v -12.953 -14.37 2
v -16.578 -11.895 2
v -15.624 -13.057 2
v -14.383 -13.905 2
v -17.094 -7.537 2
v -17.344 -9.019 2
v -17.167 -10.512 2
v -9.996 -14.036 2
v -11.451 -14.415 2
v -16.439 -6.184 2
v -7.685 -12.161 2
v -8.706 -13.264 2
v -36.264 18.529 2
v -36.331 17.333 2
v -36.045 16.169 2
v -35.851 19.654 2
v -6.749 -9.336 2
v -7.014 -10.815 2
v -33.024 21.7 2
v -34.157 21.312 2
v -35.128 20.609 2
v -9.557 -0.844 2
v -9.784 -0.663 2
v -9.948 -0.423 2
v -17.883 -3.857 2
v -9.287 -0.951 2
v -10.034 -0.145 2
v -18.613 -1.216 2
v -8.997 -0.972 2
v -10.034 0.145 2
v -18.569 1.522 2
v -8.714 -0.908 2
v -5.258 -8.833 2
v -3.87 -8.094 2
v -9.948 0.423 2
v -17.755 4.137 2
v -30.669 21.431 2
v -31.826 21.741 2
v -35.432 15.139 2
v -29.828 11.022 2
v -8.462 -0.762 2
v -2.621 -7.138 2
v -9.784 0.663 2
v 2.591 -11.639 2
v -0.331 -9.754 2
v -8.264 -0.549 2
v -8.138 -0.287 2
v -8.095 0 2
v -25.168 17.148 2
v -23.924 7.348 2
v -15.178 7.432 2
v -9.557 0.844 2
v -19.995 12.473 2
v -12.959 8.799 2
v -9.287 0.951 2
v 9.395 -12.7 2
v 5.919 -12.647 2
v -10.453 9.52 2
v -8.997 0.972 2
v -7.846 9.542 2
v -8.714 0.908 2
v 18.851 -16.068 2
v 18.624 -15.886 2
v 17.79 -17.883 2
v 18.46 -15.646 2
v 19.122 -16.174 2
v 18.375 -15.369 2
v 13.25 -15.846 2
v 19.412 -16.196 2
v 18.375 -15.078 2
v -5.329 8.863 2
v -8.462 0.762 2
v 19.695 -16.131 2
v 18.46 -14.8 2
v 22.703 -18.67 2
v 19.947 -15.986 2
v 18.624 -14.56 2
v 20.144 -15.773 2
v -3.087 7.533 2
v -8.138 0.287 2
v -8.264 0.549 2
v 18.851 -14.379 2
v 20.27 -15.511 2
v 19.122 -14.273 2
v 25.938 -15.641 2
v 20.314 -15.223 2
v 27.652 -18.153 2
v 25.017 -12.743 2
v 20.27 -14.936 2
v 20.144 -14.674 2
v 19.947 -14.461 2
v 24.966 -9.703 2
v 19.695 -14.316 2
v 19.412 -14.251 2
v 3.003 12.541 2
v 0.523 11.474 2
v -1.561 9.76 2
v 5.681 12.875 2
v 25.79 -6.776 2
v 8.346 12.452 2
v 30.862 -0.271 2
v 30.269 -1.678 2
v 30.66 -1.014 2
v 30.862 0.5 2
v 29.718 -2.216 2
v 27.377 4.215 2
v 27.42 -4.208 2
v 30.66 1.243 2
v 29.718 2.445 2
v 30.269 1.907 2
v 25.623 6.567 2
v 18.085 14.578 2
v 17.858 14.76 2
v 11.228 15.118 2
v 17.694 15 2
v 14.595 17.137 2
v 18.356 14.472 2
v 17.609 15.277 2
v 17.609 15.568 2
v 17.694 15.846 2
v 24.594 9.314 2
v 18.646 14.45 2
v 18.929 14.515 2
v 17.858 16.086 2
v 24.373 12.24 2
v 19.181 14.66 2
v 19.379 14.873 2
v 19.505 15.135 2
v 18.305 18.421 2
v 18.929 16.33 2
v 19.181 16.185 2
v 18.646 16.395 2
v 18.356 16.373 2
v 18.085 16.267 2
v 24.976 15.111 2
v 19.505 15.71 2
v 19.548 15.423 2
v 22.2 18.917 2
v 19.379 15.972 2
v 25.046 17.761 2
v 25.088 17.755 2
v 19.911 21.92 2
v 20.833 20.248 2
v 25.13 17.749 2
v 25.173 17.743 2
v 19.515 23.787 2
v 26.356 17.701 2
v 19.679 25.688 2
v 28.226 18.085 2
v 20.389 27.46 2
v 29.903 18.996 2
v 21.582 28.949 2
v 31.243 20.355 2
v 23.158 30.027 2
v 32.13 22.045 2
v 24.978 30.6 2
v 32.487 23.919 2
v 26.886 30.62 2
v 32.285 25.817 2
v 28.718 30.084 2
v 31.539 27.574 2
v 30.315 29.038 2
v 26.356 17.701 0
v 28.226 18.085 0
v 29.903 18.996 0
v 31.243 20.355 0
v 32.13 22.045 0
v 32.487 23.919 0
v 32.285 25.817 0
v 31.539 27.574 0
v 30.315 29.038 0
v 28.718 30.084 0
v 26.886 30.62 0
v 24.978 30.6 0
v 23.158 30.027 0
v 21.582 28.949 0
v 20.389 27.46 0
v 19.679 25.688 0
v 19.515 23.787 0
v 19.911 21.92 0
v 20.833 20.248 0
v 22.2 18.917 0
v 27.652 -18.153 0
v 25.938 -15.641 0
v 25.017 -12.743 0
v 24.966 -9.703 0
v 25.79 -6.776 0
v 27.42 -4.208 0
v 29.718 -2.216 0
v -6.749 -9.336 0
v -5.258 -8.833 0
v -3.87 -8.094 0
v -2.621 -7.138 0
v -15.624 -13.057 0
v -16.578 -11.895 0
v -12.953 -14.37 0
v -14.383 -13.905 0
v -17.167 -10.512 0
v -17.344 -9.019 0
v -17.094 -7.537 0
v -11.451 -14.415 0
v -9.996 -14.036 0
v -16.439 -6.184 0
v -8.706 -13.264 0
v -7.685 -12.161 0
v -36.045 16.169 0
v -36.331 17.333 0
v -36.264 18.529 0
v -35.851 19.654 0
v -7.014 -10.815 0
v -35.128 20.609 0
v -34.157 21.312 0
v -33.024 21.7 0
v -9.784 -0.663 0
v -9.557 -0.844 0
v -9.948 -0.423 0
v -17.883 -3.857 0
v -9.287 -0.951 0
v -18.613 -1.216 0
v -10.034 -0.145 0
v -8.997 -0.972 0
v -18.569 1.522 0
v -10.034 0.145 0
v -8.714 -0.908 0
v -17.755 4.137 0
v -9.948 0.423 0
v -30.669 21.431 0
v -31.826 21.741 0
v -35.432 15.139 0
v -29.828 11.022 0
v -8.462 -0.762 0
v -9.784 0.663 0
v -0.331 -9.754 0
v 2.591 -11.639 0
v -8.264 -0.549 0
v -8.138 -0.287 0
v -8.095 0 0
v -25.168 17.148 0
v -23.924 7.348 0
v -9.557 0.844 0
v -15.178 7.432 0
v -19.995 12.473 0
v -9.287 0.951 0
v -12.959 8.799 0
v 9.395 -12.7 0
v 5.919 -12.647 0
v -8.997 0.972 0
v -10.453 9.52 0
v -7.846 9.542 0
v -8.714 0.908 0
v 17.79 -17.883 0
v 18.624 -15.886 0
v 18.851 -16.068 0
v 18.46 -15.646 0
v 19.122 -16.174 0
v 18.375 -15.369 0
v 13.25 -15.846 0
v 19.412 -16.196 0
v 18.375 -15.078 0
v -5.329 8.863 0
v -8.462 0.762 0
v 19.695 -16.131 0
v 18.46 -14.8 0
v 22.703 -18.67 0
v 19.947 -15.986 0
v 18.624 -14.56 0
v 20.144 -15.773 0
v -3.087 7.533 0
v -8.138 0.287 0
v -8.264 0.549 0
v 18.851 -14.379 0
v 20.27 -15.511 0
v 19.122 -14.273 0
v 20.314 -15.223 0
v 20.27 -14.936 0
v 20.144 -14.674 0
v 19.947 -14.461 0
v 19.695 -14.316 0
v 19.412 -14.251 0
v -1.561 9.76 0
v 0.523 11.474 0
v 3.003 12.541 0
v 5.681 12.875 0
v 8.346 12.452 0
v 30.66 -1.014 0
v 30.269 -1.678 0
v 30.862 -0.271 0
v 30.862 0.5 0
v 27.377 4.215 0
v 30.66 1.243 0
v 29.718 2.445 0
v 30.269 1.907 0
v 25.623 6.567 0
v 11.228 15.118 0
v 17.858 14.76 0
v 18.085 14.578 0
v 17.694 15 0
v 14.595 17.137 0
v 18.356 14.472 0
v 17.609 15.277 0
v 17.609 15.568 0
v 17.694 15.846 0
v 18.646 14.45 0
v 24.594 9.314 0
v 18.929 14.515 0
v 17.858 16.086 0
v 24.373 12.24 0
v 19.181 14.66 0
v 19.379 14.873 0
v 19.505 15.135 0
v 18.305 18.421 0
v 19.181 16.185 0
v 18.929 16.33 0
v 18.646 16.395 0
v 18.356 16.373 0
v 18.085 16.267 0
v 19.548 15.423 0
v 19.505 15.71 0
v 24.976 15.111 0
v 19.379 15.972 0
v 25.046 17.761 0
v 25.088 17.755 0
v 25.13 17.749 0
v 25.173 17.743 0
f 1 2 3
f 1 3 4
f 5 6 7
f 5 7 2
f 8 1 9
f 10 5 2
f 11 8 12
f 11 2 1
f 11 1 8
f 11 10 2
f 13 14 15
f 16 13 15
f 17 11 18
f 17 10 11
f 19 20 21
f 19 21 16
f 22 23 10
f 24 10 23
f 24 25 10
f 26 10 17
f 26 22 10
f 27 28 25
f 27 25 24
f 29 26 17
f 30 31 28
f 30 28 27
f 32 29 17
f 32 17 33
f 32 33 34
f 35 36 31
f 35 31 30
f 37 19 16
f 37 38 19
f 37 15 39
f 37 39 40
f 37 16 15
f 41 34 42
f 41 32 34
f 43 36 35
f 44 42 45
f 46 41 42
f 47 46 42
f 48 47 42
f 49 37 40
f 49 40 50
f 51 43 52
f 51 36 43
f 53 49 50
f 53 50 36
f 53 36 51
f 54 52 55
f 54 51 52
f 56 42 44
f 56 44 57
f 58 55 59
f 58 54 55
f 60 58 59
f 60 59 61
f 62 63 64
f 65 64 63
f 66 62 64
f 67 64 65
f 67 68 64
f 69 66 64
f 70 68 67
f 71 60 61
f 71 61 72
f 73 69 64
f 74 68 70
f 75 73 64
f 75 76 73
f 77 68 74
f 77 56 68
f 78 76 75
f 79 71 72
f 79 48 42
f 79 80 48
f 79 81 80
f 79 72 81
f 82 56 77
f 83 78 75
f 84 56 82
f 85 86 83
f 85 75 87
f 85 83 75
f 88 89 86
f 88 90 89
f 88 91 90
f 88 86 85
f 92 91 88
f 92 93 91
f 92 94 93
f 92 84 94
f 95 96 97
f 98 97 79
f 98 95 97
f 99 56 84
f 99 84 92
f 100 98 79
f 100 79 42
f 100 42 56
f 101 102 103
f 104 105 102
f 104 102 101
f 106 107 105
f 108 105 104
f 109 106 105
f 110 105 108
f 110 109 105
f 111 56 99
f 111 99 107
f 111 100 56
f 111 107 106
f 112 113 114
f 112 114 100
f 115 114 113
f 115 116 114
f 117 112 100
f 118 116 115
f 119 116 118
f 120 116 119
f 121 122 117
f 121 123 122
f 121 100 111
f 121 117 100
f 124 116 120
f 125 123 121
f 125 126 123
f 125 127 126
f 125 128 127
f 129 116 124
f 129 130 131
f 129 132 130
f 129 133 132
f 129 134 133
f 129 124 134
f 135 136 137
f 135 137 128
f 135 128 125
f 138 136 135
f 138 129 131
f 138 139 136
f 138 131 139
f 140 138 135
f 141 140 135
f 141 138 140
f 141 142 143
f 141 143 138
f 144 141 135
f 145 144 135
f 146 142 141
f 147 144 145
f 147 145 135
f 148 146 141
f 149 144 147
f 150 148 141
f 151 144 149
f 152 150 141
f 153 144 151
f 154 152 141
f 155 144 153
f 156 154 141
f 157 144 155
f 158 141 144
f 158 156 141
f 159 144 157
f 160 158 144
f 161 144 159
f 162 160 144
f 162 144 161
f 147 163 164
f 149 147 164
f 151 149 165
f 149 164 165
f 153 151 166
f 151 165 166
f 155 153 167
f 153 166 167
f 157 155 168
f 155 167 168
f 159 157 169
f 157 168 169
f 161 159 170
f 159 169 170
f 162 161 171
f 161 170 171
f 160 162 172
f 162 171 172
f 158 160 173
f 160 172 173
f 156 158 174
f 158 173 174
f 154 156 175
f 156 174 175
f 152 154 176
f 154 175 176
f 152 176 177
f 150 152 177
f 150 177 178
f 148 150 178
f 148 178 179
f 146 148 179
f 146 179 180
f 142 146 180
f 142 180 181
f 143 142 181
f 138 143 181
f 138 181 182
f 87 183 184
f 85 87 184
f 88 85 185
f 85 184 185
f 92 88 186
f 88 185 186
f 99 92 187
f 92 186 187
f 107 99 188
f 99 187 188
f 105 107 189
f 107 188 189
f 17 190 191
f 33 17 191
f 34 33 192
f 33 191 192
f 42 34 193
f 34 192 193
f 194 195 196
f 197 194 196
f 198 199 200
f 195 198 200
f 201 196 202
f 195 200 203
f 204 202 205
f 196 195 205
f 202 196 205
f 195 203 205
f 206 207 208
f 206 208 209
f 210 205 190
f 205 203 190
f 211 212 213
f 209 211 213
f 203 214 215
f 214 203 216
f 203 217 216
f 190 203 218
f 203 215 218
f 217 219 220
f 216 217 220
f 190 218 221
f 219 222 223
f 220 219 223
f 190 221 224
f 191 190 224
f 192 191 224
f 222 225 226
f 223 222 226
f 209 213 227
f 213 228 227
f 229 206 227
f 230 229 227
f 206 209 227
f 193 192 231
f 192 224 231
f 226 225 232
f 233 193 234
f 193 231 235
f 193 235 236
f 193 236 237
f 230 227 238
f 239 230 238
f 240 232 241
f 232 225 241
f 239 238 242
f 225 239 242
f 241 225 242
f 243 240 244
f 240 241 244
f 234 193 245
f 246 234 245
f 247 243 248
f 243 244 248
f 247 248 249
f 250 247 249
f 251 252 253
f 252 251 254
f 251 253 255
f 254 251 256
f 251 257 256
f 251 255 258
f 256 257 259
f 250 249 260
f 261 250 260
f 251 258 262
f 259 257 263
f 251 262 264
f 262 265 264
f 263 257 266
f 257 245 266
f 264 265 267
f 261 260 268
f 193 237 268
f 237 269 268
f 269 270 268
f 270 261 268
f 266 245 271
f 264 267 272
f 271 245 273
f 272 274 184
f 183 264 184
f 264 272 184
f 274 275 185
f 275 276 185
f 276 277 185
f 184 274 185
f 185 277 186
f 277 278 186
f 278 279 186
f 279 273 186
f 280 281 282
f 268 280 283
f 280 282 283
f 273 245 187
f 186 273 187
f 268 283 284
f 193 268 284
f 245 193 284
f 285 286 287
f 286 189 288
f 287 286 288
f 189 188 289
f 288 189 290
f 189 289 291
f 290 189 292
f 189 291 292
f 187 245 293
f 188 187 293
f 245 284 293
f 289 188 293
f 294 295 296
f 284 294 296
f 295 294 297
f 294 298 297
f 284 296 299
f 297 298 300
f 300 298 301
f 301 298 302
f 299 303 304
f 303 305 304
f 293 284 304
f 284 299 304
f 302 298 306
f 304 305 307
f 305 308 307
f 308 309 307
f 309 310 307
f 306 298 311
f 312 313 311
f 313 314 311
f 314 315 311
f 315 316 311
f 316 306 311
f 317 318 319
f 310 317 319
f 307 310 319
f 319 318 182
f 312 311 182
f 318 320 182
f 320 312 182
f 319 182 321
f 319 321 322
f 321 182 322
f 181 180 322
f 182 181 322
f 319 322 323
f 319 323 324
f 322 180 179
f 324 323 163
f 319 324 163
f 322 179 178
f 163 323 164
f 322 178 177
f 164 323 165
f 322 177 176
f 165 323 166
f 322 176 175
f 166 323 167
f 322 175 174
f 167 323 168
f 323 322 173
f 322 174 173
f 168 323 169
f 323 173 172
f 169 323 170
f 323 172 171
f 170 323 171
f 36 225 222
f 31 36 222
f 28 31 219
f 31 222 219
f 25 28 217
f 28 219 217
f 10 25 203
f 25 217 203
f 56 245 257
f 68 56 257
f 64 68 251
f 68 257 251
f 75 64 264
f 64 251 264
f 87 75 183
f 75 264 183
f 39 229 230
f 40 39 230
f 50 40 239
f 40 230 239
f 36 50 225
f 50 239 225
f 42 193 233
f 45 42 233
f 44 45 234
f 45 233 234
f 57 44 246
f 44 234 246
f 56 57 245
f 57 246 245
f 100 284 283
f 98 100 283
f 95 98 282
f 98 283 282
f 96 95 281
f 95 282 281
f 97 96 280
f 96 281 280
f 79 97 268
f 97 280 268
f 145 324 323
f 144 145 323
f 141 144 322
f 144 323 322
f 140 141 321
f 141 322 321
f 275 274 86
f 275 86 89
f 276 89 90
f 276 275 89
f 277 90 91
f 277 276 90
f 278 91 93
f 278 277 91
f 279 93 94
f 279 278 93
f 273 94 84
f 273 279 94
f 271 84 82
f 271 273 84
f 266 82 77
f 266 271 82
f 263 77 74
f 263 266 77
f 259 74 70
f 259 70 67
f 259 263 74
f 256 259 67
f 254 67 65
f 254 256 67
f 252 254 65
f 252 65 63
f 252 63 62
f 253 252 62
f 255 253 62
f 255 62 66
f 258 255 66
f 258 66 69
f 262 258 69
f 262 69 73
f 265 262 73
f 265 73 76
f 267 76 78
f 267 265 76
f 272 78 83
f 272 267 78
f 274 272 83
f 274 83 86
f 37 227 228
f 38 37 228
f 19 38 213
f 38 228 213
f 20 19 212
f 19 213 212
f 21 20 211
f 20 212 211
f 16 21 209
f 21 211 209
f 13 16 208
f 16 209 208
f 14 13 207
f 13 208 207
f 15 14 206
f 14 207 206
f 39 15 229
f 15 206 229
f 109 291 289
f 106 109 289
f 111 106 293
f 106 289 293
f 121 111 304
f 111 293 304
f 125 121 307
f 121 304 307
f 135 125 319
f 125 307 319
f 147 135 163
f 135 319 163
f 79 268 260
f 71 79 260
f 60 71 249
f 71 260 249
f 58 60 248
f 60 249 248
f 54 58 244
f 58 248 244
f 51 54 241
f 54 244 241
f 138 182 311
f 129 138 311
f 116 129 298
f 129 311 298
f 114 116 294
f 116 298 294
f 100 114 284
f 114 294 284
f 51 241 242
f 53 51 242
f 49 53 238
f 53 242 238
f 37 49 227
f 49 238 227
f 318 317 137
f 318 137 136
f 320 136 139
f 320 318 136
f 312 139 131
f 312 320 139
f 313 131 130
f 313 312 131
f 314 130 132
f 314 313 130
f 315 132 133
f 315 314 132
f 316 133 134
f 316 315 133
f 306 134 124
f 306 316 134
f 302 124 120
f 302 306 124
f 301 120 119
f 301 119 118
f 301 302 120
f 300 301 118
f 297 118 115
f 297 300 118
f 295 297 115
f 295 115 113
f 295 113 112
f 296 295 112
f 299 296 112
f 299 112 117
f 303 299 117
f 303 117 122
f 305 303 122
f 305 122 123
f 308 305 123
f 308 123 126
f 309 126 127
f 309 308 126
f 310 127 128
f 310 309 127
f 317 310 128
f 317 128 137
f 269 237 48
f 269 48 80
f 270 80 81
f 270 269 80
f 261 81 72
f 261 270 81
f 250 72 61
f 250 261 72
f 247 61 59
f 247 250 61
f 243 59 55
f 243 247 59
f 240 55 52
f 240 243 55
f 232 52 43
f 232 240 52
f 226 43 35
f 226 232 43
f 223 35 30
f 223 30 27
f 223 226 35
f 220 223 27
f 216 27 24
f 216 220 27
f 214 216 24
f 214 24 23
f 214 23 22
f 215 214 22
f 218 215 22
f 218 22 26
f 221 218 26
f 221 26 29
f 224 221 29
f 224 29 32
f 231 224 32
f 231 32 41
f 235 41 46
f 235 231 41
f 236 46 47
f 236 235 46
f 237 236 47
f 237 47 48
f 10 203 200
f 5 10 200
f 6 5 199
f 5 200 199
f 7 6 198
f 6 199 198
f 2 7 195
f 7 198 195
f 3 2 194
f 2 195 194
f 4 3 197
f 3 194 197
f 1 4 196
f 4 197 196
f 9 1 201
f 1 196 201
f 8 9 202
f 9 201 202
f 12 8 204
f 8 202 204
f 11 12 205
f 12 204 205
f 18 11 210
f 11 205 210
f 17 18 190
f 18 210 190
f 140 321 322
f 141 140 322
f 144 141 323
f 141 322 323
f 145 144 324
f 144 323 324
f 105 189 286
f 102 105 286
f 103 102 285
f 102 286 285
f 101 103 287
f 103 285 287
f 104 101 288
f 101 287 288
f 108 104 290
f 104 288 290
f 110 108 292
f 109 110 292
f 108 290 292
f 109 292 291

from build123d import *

# Parameters (mm, degrees)
F1_R     = 0.975
F1_R_2   = 5.495
F2_DEPTH = 2


# Not quite as in the source:
# - the program builds the solid bodies; features that only make, move or delete a surface that nothing else refers to are left out


with BuildPart() as f2:
    # F1 (on Top) → F2 (new body)
    with BuildSketch(Plane.XY):
        with BuildLine():
            ThreePointArc((8.3461548541, 12.451567302), (1.7252198574, 12.0948349613), (-3.0867358283, 7.5331334509))
            ThreePointArc((-3.0867358283, 7.5331334509), (-9.1504459177, 9.6196614304), (-15.1782928372, 7.431685066))
            ThreePointArc((-15.1782928372, 7.431685066), (-22.5381757879, 14.8578874844), (-30.6692253798, 21.4307401329))
            ThreePointArc((-30.6692253798, 21.4307401329), (-35.5250947404, 20.1584087851), (-35.4319922626, 15.1394819841))
            ThreePointArc((-35.4319922626, 15.1394819841), (-26.9109452732, 9.1280444677), (-17.7545223506, 4.1374991998))
            ThreePointArc((-17.7545223506, 4.1374991998), (-18.6125164693, -1.2164521529), (-16.4388114376, -6.1839420049))
            ThreePointArc((-16.4388114376, -6.1839420049), (-13.6846503599, -14.1883393203), (-6.7486233515, -9.3357823691))
            ThreePointArc((-6.7486233515, -9.3357823691), (-4.5490625181, -8.4916373097), (-2.6206436977, -7.1381789267))
            ThreePointArc((-2.6206436977, -7.1381789267), (2.5909813664, -11.6392406956), (9.3949967995, -12.7003565431))
            ThreePointArc((9.3949967995, -12.7003565431), (17.7901975829, -17.882711986), (27.6524089277, -18.1528814137))
            ThreePointArc((27.6524089277, -18.1528814137), (24.9662444476, -9.7026669711), (29.7177772104, -2.2163768254))
            ThreePointArc((29.7177772104, -2.2163768254), (30.8881367766, 0.1144698658), (29.7177772104, 2.4453165571))
            ThreePointArc((29.7177772104, 2.4453165571), (24.594325339, 9.3144076758), (26.3560396261, 17.700737901))
            ThreePointArc((26.3560396261, 17.700737901), (27.8220537541, 30.4194435664), (22.2002219007, 18.9168491704))
            ThreePointArc((22.2002219007, 18.9168491704), (14.5953140013, 17.1367848208), (8.3461548541, 12.451567302))
        make_face()
        with BuildLine():
            Line((-17.6755707347, -0.4939858073), (-12.0034380316, -0.4939858073))
            ThreePointArc((-12.0034380316, -0.4939858073), (-10.5336675739, -2.589890275), (-7.9799964747, -2.7682288675))
            Line((-7.9799964747, -2.7682288675), (-5.2005199999, -7.702828149))
            ThreePointArc((-5.2005199999, -7.702828149), (-5.9901385216, -8.0511163546), (-6.810625891, -8.3187029026))
            ThreePointArc((-6.810625891, -8.3187029026), (-7.2968984625, -8.4404428952), (-7.7895048721, -8.5332898913))
            ThreePointArc((-7.7895048721, -8.5332898913), (-13.3753397984, -13.2373782399), (-15.1250045058, -6.1473378715))
            ThreePointArc((-15.1250045058, -6.1473378715), (-15.4687321672, -5.7824640106), (-15.7903406401, -5.3979518136))
            ThreePointArc((-15.7903406401, -5.3979518136), (-17.1156764189, -3.0930980197), (-17.6755707347, -0.4939858073))
        make_face(mode=Mode.SUBTRACT)
        with Locations((-9.069736782, 0)):
            Circle(F1_R, mode=Mode.SUBTRACT)
        with Locations((19.3387361329, -15.2233078331)):
            Circle(F1_R, mode=Mode.SUBTRACT)
        with BuildLine():
            ThreePointArc((20.3872606575, 17.7804109262), (22.7170872685, 17.9218257414), (25.0456576674, 17.7610461256))
            ThreePointArc((25.0456576674, 17.7610461256), (25.1091906486, 17.7523846185), (25.172692422, 17.7434972003))
            ThreePointArc((25.172692422, 17.7434972003), (23.684740061, 8.8128379715), (29.166954709, 1.6075621931))
            ThreePointArc((29.166954709, 1.6075621931), (29.8880875558, 0.1007714549), (29.1453733807, -1.3954994316))
            ThreePointArc((29.1453733807, -1.3954994316), (24.1127403048, -8.7463736841), (25.8509191741, -17.4837349662))
            ThreePointArc((25.8509191741, -17.4837349662), (23.5178476173, -17.6742786032), (21.1797885868, -17.5602183711))
            ThreePointArc((21.1797885868, -17.5602183711), (20.0605128424, -12.3371922115), (16.6143622853, -16.4184698048))
            ThreePointArc((16.6143622853, -16.4184698048), (12.9131993659, -14.4284100321), (9.7748074556, -11.6338723113))
            ThreePointArc((9.7748074556, -11.6338723113), (2.6662624957, -10.5651214915), (-2.4218244994, -5.4872271944))
            ThreePointArc((-2.4218244994, -5.4872271944), (-3.341520275, -6.4414234179), (-4.3966137229, -7.2433639198))
            Line((-4.3966137229, -7.2433639198), (-7.1815796443, -2.2990188393))
            ThreePointArc((-7.1815796443, -2.2990188393), (-6.094920293, 0.0330432552), (-7.2331126554, 2.3403924495))
            Line((-7.2331126554, 2.3403924495), (-4.4863168152, 7.3004562466))
            ThreePointArc((-4.4863168152, 7.3004562466), (-3.5431905745, 6.6152616741), (-2.7011412367, 5.8090783073))
            ThreePointArc((-2.7011412367, 5.8090783073), (1.7884096787, 11.0249893996), (8.6656284498, 11.2812274136))
            ThreePointArc((8.6656284498, 11.2812274136), (11.9172089396, 14.3848906615), (15.8355289242, 16.5876774731))
            ThreePointArc((15.8355289242, 16.5876774731), (19.3270471679, 12.5448488398), (20.3872606575, 17.7804109262))
        make_face(mode=Mode.SUBTRACT)
        with BuildLine():
            ThreePointArc((-16.3638620166, 4.5934885503), (-26.0025688441, 9.741867589), (-34.9414590553, 16.0273045526))
            ThreePointArc((-34.9414590553, 16.0273045526), (-34.7398034138, 19.6908643856), (-31.1758954498, 20.5631577259))
            ThreePointArc((-31.1758954498, 20.5631577259), (-22.796689347, 13.7414479433), (-15.2552633126, 6.0036373591))
            ThreePointArc((-15.2552633126, 6.0036373591), (-10.598818784, 8.4832958354), (-5.3696469446, 7.7854823354))
            Line((-5.3696469446, 7.7854823354), (-8.119843394, 2.8192778422))
            ThreePointArc((-8.119843394, 2.8192778422), (-10.5540740424, 2.5782489983), (-11.9848002521, 0.5941632478))
            Line((-11.9848002521, 0.5941632478), (-17.6692350252, 0.5941632478))
            ThreePointArc((-17.6692350252, 0.5941632478), (-17.2642756667, 2.67468362), (-16.3638620166, 4.5934885503))
        make_face(mode=Mode.SUBTRACT)
        with Locations((18.5729401514, 15.4226861541)):
            Circle(F1_R, mode=Mode.SUBTRACT)
        with Locations((25.9979280814, 24.1858578784)):
            Circle(F1_R_2, mode=Mode.SUBTRACT)
        with BuildLine():
            ThreePointArc((25.172692422, 17.7434972003), (25.1091317315, 17.7519581241), (25.0456576674, 17.7610461256))
            ThreePointArc((25.0456576674, 17.7610461256), (22.7170872685, 17.9218257414), (20.3872606575, 17.7804109262))
            ThreePointArc((20.3872606575, 17.7804109262), (19.3270471679, 12.5448488398), (15.8355289242, 16.5876774731))
            ThreePointArc((15.8355289242, 16.5876774731), (11.9172089396, 14.3848906615), (8.6656284498, 11.2812274136))
            ThreePointArc((8.6656284498, 11.2812274136), (1.7884096787, 11.0249893996), (-2.7011412367, 5.8090783073))
            ThreePointArc((-2.7011412367, 5.8090783073), (-3.5431905745, 6.6152616741), (-4.4863168152, 7.3004562466))
            Line((-4.4863168152, 7.3004562466), (-7.2331126554, 2.3403924495))
            ThreePointArc((-7.2331126554, 2.3403924495), (-6.094920293, 0.0330432552), (-7.1815796443, -2.2990188393))
            Line((-7.1815796443, -2.2990188393), (-4.3966137229, -7.2433639198))
            ThreePointArc((-4.3966137229, -7.2433639198), (-3.341520275, -6.4414234179), (-2.4218244994, -5.4872271944))
            ThreePointArc((-2.4218244994, -5.4872271944), (2.6662624957, -10.5651214915), (9.7748074556, -11.6338723113))
            ThreePointArc((9.7748074556, -11.6338723113), (12.9131993659, -14.4284100321), (16.6143622853, -16.4184698048))
            ThreePointArc((16.6143622853, -16.4184698048), (20.0605128424, -12.3371922115), (21.1797885868, -17.5602183711))
            ThreePointArc((21.1797885868, -17.5602183711), (23.5178476173, -17.6742786032), (25.8509191741, -17.4837349662))
            ThreePointArc((25.8509191741, -17.4837349662), (24.1127403048, -8.7463736841), (29.1453733807, -1.3954994316))
            ThreePointArc((29.1453733807, -1.3954994316), (29.8880875558, 0.1007714549), (29.166954709, 1.6075621931))
            ThreePointArc((29.166954709, 1.6075621931), (23.684740061, 8.8128379715), (25.172692422, 17.7434972003))
        make_face()
        with BuildLine():
            ThreePointArc((-31.1758954498, 20.5631577259), (-34.7398034138, 19.6908643856), (-34.9414590553, 16.0273045526))
            ThreePointArc((-34.9414590553, 16.0273045526), (-26.0025688441, 9.741867589), (-16.3638620166, 4.5934885503))
            ThreePointArc((-16.3638620166, 4.5934885503), (-17.2642756667, 2.67468362), (-17.6692350252, 0.5941632478))
            Line((-17.6692350252, 0.5941632478), (-11.9848002521, 0.5941632478))
            ThreePointArc((-11.9848002521, 0.5941632478), (-10.5540740424, 2.5782489983), (-8.119843394, 2.8192778422))
            Line((-8.119843394, 2.8192778422), (-5.3696469446, 7.7854823354))
            ThreePointArc((-5.3696469446, 7.7854823354), (-10.598818784, 8.4832958354), (-15.2552633126, 6.0036373591))
            ThreePointArc((-15.2552633126, 6.0036373591), (-22.796689347, 13.7414479433), (-31.1758954498, 20.5631577259))
        make_face()
        with BuildLine():
            ThreePointArc((-7.9799964747, -2.7682288675), (-10.5336675739, -2.589890275), (-12.0034380316, -0.4939858073))
            Line((-12.0034380316, -0.4939858073), (-17.6755707347, -0.4939858073))
            ThreePointArc((-17.6755707347, -0.4939858073), (-17.1156764189, -3.0930980197), (-15.7903406401, -5.3979518136))
            ThreePointArc((-15.7903406401, -5.3979518136), (-15.4687321672, -5.7824640106), (-15.1250045058, -6.1473378715))
            ThreePointArc((-15.1250045058, -6.1473378715), (-13.3753397984, -13.2373782399), (-7.7895048721, -8.5332898913))
            ThreePointArc((-7.7895048721, -8.5332898913), (-7.2968984625, -8.4404428952), (-6.810625891, -8.3187029026))
            ThreePointArc((-6.810625891, -8.3187029026), (-5.9901385216, -8.0511163546), (-5.2005199999, -7.702828149))
            Line((-5.2005199999, -7.702828149), (-7.9799964747, -2.7682288675))
        make_face()
        with Locations((25.9979280814, 24.1858578784)):
            Circle(F1_R_2)
    extrude(amount=F2_DEPTH)


solid = f2.part
